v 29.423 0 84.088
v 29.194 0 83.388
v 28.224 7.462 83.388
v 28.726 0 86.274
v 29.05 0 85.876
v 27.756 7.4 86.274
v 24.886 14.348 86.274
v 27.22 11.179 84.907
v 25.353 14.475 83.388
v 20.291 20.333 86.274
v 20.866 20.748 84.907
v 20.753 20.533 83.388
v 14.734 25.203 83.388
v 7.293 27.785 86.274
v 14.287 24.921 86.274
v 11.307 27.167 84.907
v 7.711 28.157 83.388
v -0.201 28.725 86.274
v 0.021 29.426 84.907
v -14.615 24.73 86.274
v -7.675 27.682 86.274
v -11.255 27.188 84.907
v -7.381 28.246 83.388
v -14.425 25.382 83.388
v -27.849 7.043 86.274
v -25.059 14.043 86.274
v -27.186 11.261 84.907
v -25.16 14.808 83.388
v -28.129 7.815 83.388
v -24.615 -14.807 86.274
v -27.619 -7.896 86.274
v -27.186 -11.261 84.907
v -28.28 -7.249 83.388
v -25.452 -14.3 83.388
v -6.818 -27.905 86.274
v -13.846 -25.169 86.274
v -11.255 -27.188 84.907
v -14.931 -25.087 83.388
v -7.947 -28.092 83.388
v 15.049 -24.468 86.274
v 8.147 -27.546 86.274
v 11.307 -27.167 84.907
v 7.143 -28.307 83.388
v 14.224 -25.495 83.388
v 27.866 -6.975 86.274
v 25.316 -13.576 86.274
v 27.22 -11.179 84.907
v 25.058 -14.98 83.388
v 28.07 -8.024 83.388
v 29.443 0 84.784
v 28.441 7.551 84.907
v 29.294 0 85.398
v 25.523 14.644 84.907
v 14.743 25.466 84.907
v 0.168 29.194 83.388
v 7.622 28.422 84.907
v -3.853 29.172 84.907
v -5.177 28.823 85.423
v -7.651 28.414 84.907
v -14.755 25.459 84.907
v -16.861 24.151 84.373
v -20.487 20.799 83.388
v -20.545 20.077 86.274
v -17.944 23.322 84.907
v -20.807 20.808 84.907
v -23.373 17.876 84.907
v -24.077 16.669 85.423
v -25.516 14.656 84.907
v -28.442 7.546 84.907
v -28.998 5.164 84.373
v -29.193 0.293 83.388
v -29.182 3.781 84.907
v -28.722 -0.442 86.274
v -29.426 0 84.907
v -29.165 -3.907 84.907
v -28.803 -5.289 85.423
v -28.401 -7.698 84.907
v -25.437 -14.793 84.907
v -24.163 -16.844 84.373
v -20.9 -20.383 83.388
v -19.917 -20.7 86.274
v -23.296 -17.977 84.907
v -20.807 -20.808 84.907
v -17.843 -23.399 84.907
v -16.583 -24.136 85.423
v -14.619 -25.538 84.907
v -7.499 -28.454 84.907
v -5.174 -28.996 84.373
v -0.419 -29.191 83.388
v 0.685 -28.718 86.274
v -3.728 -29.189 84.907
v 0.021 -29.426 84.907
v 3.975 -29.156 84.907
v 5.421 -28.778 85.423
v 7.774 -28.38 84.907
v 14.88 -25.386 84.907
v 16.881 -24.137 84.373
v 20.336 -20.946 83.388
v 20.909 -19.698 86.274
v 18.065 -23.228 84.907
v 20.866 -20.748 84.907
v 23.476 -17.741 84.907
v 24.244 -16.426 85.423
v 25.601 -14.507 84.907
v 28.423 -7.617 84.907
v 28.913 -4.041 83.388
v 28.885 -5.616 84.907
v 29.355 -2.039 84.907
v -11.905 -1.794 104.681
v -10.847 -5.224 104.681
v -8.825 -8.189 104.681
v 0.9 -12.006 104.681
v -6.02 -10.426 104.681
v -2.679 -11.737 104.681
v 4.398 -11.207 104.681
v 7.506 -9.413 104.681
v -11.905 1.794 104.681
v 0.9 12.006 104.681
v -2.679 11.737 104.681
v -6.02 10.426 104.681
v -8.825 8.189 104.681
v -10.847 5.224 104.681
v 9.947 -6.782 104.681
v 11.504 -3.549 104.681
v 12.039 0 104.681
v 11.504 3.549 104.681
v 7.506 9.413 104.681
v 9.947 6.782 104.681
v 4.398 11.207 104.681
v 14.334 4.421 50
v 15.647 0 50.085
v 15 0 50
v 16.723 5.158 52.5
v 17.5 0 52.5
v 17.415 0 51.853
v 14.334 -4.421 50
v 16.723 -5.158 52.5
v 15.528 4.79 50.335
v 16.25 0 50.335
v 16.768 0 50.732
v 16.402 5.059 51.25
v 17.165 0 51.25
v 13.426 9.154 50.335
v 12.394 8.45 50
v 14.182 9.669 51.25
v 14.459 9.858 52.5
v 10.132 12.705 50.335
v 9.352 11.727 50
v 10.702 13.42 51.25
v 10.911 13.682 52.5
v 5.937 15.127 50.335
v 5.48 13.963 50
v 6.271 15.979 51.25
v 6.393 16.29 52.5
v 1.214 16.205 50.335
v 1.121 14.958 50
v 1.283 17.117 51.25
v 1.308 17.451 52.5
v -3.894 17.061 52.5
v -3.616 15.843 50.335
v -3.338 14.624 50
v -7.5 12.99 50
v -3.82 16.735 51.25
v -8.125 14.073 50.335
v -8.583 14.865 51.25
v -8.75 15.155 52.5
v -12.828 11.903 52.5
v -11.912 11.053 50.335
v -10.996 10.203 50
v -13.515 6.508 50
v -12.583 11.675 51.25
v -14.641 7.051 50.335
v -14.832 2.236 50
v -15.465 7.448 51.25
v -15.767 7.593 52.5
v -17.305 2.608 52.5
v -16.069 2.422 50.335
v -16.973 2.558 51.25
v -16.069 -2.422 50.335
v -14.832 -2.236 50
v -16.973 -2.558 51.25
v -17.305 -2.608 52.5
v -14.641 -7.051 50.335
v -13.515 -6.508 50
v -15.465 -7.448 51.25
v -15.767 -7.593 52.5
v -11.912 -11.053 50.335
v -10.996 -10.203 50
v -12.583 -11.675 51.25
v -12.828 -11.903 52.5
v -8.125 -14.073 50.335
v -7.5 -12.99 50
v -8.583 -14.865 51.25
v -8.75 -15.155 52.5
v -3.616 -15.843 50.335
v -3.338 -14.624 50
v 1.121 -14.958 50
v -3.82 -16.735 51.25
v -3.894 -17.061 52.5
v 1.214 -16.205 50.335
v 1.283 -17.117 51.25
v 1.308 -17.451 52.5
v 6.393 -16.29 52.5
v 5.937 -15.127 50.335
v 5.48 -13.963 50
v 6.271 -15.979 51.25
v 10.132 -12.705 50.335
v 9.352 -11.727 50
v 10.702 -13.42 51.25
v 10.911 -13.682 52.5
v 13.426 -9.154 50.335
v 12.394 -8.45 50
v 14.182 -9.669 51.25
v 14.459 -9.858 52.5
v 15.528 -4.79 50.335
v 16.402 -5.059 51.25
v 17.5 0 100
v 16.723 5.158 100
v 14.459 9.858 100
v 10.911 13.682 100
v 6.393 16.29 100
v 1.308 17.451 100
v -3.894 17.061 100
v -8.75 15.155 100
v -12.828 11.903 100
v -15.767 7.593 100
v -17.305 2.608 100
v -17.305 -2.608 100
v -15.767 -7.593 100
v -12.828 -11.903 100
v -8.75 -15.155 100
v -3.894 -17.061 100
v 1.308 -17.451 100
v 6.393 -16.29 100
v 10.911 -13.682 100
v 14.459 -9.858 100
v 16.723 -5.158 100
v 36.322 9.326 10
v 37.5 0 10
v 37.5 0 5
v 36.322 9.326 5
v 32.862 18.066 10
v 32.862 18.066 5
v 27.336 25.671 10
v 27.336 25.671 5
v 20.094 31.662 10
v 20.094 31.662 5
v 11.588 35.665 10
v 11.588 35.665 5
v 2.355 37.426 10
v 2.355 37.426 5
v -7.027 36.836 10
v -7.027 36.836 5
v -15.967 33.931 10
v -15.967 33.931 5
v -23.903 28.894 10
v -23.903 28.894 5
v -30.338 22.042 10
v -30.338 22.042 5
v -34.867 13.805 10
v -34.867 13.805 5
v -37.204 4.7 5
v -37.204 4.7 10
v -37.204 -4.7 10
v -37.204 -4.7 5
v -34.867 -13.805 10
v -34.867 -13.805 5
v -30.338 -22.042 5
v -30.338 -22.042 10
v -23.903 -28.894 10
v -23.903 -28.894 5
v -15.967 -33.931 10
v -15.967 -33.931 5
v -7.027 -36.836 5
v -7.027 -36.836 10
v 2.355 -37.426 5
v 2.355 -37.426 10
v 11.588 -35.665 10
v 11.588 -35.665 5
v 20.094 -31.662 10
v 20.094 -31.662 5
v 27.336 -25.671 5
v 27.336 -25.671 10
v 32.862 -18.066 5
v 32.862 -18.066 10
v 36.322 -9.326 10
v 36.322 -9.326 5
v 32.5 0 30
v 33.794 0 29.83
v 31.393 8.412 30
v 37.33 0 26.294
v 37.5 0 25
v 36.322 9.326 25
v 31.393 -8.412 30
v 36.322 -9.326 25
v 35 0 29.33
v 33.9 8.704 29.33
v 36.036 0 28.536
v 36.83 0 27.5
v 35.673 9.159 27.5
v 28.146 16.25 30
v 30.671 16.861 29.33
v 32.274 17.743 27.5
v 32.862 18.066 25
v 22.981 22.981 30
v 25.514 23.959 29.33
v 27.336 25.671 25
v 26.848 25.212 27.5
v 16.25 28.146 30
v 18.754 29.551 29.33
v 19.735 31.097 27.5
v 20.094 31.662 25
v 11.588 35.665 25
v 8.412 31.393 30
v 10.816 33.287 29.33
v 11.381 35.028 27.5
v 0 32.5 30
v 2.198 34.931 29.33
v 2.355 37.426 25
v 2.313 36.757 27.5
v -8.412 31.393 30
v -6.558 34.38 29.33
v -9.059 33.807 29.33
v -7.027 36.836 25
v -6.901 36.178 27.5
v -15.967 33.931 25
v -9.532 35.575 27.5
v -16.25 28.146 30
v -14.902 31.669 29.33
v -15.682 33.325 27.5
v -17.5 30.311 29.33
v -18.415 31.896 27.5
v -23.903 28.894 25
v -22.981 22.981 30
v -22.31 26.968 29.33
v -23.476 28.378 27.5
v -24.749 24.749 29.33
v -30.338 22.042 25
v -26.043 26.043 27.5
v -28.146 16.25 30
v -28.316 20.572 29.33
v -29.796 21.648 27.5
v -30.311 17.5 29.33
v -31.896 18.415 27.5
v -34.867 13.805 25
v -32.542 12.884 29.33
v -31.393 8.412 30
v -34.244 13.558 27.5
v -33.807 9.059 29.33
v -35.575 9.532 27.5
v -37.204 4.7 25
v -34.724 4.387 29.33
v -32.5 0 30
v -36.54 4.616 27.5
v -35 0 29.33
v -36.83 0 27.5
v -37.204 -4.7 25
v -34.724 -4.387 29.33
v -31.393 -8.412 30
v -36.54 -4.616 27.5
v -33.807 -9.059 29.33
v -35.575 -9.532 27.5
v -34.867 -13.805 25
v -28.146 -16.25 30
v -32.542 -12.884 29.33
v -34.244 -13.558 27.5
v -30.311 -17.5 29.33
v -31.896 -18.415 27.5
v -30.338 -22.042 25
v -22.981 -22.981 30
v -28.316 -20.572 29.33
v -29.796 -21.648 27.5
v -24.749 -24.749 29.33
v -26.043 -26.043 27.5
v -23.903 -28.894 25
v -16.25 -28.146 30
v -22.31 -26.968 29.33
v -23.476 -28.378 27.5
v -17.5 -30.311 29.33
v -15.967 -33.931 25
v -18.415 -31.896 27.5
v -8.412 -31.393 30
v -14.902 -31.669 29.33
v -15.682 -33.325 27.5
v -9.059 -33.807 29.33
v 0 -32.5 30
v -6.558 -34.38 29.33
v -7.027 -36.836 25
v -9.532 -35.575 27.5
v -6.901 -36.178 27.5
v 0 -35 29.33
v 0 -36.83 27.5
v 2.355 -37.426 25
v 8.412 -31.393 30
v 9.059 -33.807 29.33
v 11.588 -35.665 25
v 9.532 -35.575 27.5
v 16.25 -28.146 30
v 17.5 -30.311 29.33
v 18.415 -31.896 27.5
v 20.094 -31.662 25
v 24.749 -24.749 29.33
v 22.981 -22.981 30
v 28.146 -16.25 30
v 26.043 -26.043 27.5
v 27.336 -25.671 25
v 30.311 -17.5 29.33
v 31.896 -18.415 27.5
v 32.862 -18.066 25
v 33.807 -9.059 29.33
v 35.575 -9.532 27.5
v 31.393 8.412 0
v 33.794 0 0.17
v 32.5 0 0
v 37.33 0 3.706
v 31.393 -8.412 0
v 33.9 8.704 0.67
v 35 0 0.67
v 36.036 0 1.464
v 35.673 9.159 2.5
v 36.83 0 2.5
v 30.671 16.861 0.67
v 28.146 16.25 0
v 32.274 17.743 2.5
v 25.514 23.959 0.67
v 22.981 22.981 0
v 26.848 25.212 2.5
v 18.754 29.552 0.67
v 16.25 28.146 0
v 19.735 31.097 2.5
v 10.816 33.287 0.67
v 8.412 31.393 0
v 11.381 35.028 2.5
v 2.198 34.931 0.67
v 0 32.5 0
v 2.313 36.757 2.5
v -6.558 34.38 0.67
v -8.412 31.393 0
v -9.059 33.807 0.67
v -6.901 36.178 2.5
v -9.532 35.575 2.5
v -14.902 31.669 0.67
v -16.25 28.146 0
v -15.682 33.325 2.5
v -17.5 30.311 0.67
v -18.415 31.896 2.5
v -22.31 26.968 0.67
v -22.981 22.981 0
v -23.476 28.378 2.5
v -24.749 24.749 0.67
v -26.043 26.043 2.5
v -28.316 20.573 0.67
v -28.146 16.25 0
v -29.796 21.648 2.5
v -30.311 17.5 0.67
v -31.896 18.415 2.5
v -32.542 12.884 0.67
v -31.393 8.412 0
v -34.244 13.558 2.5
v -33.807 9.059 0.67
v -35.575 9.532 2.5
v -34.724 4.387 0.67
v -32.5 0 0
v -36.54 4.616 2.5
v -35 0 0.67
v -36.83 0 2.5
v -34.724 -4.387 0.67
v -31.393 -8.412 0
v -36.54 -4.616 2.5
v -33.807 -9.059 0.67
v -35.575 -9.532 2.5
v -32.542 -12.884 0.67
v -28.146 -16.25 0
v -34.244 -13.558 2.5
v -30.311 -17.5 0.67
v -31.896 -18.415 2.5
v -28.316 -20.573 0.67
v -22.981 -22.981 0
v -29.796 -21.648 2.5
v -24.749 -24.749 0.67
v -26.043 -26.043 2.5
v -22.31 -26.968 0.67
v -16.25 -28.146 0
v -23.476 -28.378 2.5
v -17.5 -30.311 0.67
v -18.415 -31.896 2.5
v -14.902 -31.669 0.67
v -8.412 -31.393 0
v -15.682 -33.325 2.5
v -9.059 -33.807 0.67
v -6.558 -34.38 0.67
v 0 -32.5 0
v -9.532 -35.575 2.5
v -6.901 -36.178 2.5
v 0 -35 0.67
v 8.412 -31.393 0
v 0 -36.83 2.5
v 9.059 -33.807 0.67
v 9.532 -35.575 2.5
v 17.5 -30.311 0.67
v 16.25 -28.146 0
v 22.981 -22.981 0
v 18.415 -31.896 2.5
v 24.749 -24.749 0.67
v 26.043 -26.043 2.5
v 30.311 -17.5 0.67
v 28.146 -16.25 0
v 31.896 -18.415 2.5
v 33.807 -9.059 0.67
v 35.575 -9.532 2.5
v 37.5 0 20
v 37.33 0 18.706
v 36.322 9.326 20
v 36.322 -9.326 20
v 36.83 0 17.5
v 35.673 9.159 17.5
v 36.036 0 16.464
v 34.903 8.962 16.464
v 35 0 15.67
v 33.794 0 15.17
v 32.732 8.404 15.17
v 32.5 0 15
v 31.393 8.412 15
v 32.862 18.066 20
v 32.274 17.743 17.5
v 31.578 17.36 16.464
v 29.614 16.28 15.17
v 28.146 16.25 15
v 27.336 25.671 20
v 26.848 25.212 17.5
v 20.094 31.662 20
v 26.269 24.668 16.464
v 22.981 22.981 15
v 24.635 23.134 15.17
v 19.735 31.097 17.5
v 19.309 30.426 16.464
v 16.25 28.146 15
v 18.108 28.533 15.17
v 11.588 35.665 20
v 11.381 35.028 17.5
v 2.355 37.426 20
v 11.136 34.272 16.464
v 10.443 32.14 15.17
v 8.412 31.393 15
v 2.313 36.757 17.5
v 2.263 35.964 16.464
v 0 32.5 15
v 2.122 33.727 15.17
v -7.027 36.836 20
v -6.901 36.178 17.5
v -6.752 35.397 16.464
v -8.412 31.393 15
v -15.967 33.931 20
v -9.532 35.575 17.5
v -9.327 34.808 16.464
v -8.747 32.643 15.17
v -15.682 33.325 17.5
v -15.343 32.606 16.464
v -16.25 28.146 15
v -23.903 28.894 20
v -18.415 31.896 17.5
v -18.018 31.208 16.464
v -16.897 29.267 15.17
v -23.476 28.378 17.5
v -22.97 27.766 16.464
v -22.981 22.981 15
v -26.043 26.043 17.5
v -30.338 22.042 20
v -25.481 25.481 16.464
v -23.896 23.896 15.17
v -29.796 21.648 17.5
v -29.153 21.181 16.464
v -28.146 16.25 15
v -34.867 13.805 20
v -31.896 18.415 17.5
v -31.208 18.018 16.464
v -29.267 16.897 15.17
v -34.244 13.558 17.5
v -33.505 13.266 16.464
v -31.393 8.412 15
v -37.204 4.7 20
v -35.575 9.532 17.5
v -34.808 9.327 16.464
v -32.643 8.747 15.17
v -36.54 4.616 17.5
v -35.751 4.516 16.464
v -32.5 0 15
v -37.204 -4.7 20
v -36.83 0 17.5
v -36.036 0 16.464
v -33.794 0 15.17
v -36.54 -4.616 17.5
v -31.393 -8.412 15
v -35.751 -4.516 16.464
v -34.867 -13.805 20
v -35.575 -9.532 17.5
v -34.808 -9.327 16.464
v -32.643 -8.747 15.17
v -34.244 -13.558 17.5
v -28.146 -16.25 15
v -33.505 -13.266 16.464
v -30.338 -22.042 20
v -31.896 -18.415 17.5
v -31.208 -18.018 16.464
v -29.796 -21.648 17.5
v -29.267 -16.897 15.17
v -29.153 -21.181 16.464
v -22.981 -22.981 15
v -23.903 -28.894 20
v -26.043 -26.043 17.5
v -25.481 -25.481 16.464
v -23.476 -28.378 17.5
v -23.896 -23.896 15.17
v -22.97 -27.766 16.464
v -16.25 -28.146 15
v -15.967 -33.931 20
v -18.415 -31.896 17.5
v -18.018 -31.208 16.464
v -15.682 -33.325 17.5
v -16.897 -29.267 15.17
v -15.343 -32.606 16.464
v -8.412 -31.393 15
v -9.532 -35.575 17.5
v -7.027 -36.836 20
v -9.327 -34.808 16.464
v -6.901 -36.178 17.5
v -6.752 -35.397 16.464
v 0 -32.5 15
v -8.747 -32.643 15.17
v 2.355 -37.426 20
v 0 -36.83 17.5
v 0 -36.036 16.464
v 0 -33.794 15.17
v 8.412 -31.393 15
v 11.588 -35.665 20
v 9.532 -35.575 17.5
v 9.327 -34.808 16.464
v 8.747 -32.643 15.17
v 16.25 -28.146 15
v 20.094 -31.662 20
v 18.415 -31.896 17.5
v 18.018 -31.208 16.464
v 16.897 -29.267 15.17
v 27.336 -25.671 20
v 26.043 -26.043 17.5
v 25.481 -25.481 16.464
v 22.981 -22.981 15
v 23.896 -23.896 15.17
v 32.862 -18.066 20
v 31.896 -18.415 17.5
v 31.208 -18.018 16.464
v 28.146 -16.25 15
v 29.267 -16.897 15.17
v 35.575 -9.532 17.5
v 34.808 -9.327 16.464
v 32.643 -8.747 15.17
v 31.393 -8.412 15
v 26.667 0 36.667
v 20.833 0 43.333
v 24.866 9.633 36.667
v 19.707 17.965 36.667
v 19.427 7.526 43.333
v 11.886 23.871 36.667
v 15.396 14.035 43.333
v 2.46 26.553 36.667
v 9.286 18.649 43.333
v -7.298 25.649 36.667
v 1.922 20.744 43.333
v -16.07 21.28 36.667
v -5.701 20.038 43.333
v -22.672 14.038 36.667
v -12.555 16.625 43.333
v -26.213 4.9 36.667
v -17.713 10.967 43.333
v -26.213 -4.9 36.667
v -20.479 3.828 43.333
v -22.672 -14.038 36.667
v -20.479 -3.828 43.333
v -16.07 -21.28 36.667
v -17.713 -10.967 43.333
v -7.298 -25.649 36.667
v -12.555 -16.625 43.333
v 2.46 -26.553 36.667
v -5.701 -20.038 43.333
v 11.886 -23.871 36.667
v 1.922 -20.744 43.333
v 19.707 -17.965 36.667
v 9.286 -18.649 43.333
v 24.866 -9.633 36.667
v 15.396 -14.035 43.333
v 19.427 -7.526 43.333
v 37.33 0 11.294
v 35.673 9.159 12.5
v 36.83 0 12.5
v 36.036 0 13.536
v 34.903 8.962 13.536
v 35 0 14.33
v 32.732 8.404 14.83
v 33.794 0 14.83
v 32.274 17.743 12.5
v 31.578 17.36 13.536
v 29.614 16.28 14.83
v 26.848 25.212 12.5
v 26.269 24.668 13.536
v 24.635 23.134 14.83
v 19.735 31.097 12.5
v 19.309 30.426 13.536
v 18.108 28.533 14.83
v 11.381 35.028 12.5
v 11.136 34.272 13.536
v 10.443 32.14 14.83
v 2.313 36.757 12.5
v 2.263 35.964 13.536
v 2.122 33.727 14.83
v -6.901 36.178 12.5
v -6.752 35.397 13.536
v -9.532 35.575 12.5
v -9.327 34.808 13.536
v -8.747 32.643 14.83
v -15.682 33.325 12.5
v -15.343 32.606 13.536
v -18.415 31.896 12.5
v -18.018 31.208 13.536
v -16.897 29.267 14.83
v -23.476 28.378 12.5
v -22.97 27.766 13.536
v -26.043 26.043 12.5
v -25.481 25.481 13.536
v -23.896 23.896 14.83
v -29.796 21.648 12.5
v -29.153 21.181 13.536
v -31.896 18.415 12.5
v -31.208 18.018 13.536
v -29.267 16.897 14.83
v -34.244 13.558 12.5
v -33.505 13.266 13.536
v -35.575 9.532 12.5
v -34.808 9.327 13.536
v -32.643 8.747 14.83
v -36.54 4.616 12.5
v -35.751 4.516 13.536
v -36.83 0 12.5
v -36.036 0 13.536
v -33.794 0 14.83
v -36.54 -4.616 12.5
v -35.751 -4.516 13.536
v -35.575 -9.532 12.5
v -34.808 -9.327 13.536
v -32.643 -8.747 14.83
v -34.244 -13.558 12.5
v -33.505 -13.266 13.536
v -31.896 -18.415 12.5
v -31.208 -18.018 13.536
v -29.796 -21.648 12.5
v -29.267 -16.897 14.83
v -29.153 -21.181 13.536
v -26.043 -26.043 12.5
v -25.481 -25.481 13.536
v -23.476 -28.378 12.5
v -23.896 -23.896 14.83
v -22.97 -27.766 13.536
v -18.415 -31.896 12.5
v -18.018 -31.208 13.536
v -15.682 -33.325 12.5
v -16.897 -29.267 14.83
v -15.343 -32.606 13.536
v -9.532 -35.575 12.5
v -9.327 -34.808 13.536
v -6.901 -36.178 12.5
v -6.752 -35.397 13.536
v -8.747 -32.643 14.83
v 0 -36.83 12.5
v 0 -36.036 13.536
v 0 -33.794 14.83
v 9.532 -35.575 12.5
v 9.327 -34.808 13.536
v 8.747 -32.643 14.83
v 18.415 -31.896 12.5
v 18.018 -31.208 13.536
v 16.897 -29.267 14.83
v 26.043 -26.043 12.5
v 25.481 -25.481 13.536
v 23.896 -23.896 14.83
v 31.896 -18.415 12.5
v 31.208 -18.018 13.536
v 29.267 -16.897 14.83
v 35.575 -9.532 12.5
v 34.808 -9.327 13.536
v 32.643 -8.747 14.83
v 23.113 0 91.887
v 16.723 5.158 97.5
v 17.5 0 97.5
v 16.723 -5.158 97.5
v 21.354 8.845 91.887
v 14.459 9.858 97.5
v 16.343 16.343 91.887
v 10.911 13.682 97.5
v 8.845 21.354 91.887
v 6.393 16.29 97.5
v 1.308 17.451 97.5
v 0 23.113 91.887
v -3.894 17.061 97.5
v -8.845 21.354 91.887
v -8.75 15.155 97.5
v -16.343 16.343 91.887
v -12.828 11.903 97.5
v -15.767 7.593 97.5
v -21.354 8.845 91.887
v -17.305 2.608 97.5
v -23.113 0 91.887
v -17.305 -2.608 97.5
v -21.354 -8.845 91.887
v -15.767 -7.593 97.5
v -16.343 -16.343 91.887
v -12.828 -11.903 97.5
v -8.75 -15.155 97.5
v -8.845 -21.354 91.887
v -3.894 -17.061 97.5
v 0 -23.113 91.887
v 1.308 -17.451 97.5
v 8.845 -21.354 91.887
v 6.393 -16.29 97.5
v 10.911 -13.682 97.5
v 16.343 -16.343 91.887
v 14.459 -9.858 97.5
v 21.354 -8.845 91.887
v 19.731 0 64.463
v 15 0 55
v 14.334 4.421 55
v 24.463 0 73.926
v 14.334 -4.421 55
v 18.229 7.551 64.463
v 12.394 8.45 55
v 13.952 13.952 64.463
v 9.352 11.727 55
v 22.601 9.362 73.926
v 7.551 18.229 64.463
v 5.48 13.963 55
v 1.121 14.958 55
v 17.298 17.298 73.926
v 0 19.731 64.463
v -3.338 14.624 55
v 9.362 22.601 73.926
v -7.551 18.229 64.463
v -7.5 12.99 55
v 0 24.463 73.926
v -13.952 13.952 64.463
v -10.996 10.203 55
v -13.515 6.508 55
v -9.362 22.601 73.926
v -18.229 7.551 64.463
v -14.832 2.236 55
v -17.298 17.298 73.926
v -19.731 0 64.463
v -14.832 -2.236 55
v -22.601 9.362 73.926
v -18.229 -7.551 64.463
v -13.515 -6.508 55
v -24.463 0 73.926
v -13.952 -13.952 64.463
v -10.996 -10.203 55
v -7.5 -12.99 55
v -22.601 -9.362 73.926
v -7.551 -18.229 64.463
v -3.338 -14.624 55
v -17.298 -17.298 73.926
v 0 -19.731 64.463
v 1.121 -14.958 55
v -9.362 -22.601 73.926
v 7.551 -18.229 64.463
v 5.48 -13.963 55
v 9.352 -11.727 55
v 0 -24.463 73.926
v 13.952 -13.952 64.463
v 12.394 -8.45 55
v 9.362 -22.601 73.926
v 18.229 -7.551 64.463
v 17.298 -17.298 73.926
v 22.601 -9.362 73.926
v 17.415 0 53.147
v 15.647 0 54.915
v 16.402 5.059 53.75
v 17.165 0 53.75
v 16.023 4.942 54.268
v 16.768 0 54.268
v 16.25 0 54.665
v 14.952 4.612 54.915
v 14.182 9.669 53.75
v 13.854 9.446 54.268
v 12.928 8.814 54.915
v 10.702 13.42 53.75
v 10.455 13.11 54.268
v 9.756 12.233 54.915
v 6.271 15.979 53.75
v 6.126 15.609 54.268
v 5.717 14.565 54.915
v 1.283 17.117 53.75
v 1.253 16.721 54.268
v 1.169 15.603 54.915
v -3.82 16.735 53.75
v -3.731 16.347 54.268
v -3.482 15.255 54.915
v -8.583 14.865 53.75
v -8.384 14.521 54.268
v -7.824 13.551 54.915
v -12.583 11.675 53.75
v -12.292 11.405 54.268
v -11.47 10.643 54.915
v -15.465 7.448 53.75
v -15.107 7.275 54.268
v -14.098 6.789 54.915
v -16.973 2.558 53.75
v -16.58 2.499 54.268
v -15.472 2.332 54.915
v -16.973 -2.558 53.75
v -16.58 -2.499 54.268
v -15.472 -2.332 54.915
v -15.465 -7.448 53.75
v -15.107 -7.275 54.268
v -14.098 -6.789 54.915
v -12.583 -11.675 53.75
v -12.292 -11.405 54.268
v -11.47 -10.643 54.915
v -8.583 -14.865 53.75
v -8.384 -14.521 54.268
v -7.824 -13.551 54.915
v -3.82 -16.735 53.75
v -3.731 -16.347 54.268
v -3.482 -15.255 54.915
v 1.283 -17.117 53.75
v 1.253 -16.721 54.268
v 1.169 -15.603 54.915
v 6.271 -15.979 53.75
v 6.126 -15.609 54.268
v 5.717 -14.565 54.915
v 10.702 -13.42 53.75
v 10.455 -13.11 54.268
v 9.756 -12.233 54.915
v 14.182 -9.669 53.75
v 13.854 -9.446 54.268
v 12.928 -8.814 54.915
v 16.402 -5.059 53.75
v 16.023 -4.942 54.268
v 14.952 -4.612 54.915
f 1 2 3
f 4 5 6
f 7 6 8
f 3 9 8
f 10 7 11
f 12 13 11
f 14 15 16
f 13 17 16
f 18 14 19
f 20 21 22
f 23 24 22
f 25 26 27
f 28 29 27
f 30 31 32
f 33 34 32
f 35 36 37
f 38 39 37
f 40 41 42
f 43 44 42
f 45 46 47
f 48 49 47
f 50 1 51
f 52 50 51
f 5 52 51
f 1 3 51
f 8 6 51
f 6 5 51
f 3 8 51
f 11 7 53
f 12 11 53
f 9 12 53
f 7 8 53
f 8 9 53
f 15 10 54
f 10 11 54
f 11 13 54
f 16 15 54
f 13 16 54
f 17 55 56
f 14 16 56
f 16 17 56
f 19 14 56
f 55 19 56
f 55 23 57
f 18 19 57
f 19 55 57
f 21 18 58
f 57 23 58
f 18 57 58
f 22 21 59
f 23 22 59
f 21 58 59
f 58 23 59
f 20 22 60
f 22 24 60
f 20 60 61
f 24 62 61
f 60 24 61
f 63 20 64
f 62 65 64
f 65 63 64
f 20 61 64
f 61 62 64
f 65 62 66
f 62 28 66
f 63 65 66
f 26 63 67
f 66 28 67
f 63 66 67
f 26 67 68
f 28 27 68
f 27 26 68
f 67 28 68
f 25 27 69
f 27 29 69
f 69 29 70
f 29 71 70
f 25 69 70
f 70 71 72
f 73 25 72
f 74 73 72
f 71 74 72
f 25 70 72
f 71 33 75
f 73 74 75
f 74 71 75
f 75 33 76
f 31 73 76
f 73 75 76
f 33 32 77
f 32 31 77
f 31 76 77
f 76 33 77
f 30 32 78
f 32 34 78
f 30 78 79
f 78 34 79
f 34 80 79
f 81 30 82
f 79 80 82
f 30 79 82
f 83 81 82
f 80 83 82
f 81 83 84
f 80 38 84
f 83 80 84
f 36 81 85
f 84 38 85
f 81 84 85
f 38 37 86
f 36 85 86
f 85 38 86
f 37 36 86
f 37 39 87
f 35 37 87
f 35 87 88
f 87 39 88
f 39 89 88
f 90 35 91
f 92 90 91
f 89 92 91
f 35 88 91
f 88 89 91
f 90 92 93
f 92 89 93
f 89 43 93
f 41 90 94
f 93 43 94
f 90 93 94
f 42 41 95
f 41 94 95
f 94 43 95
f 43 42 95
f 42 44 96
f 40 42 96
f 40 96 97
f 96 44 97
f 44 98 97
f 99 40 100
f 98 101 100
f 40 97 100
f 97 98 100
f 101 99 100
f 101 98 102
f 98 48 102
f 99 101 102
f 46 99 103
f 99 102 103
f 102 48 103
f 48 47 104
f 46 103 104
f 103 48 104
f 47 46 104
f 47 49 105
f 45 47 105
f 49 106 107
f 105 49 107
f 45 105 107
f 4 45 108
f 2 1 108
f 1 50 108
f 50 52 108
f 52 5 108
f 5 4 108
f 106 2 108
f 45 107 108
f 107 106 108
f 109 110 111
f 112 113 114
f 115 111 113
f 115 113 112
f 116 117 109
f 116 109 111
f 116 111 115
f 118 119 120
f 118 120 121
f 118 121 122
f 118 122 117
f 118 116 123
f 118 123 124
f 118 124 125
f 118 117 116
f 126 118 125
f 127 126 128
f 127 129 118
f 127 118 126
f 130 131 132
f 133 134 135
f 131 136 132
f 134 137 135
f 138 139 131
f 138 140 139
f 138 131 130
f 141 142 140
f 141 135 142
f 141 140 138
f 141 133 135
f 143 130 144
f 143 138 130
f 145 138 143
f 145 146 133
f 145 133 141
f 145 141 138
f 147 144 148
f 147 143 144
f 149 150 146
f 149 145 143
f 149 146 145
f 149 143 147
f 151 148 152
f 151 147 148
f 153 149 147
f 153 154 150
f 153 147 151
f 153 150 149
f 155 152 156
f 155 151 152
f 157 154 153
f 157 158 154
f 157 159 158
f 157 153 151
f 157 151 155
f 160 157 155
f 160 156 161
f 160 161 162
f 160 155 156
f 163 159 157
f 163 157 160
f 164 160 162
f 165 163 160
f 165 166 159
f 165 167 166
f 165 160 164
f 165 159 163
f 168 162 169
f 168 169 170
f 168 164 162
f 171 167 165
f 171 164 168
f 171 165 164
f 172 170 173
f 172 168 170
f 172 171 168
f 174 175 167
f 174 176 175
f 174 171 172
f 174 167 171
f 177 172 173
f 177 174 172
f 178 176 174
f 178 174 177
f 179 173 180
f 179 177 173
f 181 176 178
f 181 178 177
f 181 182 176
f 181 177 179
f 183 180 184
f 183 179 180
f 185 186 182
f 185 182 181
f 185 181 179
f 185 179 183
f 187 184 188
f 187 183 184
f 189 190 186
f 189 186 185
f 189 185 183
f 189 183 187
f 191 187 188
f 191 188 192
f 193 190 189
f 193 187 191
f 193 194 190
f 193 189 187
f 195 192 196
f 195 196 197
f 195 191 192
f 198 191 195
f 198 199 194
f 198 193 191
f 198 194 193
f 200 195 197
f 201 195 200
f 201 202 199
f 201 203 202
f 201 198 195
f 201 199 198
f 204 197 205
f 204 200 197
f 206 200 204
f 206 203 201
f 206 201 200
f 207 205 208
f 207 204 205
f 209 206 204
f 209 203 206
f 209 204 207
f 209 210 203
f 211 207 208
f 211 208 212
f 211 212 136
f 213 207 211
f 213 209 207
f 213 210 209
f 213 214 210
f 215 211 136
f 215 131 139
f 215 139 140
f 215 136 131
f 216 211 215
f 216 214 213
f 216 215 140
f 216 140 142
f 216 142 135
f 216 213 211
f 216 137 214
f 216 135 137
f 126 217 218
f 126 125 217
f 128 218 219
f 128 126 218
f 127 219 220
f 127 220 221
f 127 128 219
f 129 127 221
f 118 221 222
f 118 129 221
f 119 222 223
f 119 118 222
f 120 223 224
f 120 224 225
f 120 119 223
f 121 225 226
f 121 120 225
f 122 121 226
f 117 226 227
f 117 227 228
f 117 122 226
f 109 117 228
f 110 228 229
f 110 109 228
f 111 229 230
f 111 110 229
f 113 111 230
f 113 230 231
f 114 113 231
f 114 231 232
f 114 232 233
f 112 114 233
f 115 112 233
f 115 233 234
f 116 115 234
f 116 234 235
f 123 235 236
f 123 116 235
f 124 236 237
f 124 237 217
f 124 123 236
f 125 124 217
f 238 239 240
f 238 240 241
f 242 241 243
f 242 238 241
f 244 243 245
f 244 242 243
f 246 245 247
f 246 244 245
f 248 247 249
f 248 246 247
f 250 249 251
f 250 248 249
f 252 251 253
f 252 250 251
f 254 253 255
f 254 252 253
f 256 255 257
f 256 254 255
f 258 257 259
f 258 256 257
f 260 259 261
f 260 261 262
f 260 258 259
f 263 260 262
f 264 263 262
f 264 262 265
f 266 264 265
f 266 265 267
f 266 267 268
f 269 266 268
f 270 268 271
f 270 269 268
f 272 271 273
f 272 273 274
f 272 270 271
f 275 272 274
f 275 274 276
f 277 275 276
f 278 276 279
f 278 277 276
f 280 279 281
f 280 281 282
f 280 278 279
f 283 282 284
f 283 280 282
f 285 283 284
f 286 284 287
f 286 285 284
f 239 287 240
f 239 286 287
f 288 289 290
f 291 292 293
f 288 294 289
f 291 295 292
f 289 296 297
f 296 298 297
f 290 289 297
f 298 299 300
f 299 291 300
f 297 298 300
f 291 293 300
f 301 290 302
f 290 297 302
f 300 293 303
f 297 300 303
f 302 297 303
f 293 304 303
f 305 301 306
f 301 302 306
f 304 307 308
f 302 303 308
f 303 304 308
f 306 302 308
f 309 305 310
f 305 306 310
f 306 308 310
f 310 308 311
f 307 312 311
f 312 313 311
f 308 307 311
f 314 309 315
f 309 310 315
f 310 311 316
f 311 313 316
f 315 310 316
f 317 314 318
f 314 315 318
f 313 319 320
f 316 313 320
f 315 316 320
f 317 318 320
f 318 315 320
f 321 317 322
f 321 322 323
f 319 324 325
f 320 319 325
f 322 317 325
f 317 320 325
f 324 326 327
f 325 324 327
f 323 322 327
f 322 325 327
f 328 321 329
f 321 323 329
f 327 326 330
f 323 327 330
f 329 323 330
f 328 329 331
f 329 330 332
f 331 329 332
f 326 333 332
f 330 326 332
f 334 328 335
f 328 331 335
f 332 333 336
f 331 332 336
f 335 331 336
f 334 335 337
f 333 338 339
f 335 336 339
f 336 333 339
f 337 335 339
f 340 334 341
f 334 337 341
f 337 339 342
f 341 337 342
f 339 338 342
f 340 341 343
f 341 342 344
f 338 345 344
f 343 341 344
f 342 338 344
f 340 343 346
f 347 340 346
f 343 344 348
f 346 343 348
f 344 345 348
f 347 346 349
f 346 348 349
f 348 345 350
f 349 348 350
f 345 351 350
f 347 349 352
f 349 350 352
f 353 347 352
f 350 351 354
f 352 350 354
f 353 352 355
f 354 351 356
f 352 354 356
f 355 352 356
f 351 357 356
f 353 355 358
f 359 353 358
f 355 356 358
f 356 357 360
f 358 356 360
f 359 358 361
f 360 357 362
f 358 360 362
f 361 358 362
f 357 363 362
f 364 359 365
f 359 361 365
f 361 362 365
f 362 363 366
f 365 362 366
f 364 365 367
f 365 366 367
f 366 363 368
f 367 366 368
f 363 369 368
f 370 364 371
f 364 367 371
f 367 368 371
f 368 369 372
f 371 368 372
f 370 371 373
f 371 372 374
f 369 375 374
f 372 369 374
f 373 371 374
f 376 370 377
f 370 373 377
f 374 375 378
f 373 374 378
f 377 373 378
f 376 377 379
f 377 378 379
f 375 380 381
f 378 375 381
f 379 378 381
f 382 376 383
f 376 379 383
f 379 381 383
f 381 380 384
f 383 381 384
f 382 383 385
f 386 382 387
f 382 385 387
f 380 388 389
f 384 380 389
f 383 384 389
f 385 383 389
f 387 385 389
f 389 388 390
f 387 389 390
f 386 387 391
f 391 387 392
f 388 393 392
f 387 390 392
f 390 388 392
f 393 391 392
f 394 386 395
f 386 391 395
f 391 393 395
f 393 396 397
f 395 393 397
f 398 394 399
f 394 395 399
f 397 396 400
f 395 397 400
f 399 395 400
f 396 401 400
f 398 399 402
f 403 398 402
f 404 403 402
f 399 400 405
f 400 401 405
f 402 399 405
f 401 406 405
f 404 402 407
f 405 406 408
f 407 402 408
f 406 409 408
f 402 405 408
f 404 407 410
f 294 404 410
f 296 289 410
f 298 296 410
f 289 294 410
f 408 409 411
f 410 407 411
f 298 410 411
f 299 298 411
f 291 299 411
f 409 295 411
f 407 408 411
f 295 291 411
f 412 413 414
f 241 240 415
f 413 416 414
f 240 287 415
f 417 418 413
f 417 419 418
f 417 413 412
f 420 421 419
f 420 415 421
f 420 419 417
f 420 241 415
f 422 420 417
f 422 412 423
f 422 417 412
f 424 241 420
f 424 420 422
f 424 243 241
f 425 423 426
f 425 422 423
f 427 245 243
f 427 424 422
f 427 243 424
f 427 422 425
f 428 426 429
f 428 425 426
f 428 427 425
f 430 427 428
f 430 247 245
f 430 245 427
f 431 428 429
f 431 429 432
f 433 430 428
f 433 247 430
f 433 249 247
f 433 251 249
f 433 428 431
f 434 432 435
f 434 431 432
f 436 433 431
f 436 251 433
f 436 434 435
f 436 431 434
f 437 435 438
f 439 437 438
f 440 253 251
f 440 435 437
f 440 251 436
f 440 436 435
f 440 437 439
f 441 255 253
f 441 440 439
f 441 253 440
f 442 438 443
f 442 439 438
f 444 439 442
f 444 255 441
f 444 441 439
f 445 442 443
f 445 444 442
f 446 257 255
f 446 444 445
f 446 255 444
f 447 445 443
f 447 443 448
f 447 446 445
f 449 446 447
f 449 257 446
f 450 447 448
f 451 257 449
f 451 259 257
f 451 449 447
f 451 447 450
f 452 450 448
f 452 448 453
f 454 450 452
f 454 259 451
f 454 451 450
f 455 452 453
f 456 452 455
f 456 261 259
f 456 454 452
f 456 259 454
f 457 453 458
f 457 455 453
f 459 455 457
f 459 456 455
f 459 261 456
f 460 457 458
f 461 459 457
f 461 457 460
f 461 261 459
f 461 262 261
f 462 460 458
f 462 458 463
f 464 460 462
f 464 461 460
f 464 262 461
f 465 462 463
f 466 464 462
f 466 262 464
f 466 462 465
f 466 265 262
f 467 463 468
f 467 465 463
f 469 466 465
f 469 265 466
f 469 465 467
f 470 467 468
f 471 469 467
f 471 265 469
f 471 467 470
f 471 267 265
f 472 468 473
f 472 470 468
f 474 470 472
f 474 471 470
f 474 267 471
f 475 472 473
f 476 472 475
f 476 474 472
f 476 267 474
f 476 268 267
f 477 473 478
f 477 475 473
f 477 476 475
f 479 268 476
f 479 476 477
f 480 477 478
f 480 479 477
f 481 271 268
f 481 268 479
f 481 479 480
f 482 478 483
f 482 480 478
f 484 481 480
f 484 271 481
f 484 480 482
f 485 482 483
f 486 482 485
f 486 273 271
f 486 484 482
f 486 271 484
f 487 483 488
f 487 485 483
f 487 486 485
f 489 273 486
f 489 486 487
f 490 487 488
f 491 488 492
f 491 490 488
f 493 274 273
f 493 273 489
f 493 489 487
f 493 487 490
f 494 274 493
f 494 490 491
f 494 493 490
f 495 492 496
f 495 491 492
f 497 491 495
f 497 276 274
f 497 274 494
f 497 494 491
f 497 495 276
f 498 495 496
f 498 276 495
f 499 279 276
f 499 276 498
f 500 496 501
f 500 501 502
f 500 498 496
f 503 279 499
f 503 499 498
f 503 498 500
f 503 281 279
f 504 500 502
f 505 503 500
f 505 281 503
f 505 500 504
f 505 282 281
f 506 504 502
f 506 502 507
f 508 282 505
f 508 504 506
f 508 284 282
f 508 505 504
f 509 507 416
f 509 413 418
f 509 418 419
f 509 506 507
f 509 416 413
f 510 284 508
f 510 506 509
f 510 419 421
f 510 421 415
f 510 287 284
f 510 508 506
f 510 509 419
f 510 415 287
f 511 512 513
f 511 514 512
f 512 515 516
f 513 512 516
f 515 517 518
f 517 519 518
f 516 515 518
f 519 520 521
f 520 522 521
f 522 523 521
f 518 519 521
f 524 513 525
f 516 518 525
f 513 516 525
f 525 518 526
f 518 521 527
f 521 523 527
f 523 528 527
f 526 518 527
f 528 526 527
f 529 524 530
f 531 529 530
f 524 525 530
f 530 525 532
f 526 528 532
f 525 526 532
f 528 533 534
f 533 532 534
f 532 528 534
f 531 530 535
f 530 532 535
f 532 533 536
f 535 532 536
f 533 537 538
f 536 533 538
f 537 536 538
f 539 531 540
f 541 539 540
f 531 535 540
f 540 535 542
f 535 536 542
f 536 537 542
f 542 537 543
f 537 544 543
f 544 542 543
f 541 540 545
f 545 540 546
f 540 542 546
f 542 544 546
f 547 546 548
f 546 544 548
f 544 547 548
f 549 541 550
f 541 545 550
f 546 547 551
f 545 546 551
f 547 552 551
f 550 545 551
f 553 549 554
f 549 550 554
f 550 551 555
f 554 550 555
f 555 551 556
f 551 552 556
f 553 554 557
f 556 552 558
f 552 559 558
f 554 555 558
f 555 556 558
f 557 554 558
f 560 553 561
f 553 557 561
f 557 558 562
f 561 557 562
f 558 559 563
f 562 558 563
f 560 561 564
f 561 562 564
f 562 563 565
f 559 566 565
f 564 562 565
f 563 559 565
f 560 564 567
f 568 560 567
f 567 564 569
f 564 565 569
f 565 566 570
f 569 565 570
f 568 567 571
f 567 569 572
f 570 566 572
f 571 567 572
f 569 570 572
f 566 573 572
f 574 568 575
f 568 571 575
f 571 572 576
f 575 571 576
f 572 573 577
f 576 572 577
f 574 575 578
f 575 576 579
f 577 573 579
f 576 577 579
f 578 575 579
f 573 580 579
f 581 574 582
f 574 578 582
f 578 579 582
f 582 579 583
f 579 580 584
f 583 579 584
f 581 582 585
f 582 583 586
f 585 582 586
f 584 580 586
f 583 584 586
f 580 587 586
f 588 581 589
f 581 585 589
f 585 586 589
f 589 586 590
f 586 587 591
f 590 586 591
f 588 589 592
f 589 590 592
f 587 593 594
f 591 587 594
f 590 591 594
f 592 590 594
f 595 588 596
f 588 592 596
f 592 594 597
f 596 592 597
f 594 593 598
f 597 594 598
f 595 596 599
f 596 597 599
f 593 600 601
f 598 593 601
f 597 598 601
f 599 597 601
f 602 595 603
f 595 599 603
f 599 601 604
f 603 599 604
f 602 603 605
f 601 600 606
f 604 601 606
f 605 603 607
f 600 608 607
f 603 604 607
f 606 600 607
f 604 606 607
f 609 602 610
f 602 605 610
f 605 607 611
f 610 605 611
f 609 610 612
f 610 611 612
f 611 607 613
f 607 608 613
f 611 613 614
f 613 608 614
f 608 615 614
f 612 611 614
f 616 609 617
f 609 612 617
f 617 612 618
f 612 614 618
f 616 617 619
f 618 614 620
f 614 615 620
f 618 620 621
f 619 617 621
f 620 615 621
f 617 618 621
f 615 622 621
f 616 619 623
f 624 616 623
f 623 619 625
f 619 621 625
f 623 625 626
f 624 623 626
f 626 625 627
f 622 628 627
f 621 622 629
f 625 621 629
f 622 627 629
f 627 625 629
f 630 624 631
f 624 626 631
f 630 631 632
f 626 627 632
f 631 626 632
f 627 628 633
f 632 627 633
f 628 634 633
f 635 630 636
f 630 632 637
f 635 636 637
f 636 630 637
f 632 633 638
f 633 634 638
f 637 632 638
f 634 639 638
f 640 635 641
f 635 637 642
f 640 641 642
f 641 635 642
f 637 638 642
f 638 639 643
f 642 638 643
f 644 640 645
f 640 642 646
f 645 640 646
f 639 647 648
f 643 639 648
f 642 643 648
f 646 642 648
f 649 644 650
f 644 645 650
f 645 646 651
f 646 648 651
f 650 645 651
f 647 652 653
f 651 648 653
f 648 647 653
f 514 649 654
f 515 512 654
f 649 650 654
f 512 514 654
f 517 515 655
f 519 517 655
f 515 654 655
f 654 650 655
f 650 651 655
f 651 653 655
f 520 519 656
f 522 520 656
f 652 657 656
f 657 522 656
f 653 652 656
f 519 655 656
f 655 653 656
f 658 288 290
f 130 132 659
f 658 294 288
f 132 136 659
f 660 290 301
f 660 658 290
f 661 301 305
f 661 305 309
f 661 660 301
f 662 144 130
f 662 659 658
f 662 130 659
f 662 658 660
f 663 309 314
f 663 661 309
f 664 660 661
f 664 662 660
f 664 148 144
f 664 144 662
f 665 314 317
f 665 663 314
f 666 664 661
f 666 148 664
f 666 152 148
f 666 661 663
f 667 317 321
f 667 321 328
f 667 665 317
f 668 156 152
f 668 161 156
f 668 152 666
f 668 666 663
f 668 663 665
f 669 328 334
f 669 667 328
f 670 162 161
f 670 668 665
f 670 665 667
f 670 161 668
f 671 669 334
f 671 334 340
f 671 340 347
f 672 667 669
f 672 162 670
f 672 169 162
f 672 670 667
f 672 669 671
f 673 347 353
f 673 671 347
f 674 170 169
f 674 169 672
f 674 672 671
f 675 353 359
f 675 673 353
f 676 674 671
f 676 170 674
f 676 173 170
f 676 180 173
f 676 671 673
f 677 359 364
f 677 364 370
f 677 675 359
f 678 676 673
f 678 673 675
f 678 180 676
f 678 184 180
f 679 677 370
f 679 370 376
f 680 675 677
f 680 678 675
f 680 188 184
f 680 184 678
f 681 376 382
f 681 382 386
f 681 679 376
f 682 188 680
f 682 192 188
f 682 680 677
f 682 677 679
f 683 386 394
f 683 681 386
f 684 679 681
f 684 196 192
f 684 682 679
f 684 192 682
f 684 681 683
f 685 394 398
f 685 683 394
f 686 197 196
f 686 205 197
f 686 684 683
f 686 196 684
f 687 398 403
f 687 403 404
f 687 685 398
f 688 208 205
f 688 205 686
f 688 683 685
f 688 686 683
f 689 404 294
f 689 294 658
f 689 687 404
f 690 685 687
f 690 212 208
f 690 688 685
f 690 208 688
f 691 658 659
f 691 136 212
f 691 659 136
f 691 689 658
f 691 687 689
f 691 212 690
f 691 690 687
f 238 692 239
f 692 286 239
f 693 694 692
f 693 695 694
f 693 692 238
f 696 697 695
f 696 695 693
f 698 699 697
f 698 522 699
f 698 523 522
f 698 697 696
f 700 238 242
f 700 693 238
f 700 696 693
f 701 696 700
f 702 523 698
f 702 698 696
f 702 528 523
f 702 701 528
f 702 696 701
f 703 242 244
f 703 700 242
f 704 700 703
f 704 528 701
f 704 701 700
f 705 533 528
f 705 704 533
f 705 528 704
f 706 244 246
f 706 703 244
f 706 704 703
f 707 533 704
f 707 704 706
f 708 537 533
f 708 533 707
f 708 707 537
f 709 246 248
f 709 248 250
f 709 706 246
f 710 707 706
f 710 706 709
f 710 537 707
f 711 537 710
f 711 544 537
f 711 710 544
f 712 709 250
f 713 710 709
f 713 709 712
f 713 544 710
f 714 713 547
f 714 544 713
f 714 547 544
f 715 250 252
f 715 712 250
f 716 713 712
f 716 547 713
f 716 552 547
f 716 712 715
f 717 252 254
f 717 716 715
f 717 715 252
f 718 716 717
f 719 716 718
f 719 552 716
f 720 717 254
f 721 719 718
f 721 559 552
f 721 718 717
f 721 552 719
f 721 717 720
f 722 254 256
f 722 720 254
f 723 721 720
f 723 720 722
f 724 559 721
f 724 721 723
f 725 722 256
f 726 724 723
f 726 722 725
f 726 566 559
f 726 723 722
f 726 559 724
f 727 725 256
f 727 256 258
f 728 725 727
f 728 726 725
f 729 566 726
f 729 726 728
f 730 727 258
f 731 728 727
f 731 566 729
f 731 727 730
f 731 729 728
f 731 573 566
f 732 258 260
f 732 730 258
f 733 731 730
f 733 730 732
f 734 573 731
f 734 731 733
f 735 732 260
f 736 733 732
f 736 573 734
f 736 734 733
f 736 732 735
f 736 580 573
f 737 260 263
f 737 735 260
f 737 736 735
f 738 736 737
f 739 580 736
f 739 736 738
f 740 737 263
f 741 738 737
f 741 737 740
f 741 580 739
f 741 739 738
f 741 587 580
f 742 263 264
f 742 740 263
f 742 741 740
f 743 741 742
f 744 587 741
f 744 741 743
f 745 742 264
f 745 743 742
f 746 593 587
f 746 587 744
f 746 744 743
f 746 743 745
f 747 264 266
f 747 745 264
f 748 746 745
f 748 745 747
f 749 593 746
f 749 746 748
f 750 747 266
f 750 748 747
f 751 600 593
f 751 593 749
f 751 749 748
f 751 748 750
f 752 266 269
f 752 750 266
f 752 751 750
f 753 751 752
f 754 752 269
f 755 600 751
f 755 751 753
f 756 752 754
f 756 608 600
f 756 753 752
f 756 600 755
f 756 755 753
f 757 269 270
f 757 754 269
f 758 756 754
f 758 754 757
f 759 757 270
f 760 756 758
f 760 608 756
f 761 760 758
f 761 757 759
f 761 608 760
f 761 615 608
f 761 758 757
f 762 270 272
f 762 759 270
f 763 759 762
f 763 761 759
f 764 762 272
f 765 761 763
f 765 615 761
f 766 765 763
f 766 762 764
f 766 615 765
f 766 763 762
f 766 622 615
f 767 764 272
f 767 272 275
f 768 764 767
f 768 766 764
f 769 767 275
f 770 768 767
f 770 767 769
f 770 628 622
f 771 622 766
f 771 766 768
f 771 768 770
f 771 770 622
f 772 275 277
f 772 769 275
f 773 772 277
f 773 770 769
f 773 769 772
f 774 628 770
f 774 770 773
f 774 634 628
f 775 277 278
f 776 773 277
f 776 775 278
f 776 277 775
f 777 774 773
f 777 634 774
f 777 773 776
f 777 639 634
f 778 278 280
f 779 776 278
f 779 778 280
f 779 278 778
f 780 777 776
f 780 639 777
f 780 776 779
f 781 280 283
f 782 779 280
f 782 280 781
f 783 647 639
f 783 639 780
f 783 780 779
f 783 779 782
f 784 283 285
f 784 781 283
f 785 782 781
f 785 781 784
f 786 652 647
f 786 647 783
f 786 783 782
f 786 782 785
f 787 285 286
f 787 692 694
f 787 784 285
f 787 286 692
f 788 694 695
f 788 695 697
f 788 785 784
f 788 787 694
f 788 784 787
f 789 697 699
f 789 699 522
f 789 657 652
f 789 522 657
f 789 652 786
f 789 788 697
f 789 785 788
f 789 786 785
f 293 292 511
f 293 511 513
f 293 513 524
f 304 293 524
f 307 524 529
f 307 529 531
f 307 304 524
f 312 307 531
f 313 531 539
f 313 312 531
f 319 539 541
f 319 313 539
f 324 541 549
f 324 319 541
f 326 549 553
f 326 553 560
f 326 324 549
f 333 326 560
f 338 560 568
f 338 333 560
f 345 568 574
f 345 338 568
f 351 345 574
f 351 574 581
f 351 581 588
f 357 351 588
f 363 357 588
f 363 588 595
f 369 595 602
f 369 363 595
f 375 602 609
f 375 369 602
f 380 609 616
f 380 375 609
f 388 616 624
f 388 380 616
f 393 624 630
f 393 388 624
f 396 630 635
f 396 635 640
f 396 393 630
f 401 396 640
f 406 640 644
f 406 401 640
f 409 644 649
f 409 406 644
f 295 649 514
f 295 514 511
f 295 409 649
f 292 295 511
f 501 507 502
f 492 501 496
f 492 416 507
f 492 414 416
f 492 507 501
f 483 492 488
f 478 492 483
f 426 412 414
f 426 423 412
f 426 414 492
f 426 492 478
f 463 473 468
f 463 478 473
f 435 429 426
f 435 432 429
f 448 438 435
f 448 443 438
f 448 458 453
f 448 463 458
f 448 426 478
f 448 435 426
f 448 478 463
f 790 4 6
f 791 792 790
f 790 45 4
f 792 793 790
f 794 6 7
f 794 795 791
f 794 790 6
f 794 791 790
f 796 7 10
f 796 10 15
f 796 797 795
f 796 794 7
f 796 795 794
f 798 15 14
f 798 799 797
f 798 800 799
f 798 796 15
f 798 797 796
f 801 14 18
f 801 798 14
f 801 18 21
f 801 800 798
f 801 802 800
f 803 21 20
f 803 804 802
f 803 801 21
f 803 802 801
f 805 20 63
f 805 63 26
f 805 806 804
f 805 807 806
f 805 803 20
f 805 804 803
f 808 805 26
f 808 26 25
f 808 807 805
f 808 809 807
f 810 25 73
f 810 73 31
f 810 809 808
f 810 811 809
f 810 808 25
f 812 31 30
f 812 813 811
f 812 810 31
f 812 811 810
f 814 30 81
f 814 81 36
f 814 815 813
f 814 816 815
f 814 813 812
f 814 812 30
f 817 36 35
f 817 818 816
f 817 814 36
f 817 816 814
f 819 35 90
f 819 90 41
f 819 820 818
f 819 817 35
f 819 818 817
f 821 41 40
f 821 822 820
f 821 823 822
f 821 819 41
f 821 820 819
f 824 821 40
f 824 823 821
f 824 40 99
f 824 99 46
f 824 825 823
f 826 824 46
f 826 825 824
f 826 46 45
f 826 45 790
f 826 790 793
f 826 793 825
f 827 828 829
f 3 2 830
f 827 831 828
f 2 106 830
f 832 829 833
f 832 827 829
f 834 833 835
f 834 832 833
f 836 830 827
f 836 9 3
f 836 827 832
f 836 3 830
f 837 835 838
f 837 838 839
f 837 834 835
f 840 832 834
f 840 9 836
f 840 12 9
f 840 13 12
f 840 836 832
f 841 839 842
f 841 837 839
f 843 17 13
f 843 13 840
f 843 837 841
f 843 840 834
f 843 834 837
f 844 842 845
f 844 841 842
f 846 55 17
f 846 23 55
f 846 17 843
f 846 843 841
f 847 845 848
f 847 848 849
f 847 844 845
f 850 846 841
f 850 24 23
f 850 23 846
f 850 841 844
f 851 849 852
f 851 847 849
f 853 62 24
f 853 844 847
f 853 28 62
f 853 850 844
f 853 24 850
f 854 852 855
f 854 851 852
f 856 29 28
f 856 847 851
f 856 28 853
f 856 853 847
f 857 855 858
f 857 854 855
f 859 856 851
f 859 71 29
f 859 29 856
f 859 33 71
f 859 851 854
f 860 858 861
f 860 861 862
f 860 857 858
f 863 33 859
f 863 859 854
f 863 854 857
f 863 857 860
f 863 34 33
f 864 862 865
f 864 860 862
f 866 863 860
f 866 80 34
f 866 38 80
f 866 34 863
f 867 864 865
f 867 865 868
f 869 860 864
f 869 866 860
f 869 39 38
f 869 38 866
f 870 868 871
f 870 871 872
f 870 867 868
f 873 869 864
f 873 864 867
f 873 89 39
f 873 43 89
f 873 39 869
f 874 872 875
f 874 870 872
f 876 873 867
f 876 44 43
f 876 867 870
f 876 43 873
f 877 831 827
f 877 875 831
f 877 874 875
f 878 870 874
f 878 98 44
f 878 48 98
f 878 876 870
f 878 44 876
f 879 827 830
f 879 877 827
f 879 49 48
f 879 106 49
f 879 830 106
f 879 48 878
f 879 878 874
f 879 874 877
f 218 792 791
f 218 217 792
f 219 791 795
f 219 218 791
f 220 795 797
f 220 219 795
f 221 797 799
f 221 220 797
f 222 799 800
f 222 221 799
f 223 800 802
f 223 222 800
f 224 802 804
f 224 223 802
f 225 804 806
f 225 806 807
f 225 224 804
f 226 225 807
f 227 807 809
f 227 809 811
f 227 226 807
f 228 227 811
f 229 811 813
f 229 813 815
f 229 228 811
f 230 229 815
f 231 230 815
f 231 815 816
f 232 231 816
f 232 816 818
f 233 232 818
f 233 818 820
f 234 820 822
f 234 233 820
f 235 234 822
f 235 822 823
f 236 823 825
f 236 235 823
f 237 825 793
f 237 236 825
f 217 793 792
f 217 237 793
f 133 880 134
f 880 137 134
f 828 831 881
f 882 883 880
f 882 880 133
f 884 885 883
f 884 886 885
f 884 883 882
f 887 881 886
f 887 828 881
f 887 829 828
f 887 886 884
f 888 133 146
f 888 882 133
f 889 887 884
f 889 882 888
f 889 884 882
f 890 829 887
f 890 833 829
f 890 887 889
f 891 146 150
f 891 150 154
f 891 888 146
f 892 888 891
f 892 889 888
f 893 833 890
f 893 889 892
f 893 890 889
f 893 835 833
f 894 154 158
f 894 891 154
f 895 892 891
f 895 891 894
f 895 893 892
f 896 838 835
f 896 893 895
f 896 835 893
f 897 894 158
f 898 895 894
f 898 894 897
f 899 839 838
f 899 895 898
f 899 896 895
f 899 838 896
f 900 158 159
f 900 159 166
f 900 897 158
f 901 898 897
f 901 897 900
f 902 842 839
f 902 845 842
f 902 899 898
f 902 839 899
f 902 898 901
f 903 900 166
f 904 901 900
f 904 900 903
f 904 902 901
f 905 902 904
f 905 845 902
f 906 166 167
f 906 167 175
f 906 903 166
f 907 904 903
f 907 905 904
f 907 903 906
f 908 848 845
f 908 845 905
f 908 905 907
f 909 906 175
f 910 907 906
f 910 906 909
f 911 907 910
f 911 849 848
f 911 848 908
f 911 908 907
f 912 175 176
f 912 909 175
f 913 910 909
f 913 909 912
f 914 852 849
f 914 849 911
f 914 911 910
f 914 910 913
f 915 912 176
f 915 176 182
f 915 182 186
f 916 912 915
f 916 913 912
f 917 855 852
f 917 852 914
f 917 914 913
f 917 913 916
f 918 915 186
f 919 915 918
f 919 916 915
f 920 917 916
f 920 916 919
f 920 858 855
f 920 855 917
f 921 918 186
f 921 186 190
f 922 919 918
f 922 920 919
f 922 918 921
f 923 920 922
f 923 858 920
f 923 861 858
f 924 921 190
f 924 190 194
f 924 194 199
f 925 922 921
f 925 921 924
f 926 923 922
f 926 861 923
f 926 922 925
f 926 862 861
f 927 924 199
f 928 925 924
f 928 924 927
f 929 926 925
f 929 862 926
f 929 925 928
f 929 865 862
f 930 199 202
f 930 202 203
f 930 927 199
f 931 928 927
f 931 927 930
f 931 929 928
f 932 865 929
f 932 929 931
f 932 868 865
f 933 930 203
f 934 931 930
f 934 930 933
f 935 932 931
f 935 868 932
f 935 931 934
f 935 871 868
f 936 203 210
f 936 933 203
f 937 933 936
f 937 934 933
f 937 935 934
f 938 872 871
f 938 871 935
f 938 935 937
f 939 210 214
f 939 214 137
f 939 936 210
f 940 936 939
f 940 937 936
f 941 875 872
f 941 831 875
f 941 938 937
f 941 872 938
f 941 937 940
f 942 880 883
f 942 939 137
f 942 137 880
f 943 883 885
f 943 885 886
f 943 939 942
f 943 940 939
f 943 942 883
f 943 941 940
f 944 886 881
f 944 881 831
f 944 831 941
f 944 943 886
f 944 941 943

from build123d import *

# Parameters (mm, degrees)
F2_R = 2.49999
F3_R = 4.99999
F0_W = 37.5
F0_H = 15
F5_R = 4.9999


# Not quite as in the source:
# - a fillet or chamfer is up to 0.001 mm smaller than in the source, because OpenCascade refuses the exact size


with BuildPart() as f1:
    # F0 (on Front) → F1 (revolve)
    with BuildSketch(Plane.XZ):
        Polygon((0, 104.6807143092), (0, 55), (15, 55), (30, 85), (17.5, 97.5), (17.5, 100), (12.0391666392, 104.6807143092), align=None)
        Polygon((0, 55), (0, 50), (15, 50), (17.5, 50), (17.5, 55), (15, 55), align=None)
        Polygon((0, 50), (0, 30), (32.5, 30), (15, 50), align=None)
        Polygon((0, 30), (0, 15), (37.5, 15), (37.5, 30), (32.5, 30), align=None)
    revolve(axis=Axis((0, 0, 79.8403571546), (0, 0, 1)))

    # F2 (radius 2.5 in the source; OpenCascade refuses exactly that, so slightly less here)
    f2_edges = [f1.edges().sort_by_distance(p)[0] for p in [
        (-30, 0, 85),
        (-17.5, 0, 55),
        (-17.5, 0, 50),
    ]]
    fillet(f2_edges, radius=F2_R)

    # F3 (radius 5 in the source; OpenCascade refuses exactly that, so slightly less here)
    f3_edges = [f1.edges().sort_by_distance(p)[0] for p in [
        (-37.5, 0, 30),
        (-37.5, 0, 15),
    ]]
    fillet(f3_edges, radius=F3_R)

    # F0 (on Front) → F4 (revolve)
    with BuildSketch(Plane.XZ):
        with Locations((18.75, 7.5)):
            Rectangle(F0_W, F0_H)
    revolve(axis=Axis((0, 0, 7.5), (0, 0, 1)))

    # F5 (radius 5 in the source; OpenCascade refuses exactly that, so slightly less here)
    f5_edges = [f1.edges().sort_by_distance(p)[0] for p in [
        (-37.5, 0, 15),
        (-37.5, 0, 0),
    ]]
    fillet(f5_edges, radius=F5_R)


solid = f1.part
